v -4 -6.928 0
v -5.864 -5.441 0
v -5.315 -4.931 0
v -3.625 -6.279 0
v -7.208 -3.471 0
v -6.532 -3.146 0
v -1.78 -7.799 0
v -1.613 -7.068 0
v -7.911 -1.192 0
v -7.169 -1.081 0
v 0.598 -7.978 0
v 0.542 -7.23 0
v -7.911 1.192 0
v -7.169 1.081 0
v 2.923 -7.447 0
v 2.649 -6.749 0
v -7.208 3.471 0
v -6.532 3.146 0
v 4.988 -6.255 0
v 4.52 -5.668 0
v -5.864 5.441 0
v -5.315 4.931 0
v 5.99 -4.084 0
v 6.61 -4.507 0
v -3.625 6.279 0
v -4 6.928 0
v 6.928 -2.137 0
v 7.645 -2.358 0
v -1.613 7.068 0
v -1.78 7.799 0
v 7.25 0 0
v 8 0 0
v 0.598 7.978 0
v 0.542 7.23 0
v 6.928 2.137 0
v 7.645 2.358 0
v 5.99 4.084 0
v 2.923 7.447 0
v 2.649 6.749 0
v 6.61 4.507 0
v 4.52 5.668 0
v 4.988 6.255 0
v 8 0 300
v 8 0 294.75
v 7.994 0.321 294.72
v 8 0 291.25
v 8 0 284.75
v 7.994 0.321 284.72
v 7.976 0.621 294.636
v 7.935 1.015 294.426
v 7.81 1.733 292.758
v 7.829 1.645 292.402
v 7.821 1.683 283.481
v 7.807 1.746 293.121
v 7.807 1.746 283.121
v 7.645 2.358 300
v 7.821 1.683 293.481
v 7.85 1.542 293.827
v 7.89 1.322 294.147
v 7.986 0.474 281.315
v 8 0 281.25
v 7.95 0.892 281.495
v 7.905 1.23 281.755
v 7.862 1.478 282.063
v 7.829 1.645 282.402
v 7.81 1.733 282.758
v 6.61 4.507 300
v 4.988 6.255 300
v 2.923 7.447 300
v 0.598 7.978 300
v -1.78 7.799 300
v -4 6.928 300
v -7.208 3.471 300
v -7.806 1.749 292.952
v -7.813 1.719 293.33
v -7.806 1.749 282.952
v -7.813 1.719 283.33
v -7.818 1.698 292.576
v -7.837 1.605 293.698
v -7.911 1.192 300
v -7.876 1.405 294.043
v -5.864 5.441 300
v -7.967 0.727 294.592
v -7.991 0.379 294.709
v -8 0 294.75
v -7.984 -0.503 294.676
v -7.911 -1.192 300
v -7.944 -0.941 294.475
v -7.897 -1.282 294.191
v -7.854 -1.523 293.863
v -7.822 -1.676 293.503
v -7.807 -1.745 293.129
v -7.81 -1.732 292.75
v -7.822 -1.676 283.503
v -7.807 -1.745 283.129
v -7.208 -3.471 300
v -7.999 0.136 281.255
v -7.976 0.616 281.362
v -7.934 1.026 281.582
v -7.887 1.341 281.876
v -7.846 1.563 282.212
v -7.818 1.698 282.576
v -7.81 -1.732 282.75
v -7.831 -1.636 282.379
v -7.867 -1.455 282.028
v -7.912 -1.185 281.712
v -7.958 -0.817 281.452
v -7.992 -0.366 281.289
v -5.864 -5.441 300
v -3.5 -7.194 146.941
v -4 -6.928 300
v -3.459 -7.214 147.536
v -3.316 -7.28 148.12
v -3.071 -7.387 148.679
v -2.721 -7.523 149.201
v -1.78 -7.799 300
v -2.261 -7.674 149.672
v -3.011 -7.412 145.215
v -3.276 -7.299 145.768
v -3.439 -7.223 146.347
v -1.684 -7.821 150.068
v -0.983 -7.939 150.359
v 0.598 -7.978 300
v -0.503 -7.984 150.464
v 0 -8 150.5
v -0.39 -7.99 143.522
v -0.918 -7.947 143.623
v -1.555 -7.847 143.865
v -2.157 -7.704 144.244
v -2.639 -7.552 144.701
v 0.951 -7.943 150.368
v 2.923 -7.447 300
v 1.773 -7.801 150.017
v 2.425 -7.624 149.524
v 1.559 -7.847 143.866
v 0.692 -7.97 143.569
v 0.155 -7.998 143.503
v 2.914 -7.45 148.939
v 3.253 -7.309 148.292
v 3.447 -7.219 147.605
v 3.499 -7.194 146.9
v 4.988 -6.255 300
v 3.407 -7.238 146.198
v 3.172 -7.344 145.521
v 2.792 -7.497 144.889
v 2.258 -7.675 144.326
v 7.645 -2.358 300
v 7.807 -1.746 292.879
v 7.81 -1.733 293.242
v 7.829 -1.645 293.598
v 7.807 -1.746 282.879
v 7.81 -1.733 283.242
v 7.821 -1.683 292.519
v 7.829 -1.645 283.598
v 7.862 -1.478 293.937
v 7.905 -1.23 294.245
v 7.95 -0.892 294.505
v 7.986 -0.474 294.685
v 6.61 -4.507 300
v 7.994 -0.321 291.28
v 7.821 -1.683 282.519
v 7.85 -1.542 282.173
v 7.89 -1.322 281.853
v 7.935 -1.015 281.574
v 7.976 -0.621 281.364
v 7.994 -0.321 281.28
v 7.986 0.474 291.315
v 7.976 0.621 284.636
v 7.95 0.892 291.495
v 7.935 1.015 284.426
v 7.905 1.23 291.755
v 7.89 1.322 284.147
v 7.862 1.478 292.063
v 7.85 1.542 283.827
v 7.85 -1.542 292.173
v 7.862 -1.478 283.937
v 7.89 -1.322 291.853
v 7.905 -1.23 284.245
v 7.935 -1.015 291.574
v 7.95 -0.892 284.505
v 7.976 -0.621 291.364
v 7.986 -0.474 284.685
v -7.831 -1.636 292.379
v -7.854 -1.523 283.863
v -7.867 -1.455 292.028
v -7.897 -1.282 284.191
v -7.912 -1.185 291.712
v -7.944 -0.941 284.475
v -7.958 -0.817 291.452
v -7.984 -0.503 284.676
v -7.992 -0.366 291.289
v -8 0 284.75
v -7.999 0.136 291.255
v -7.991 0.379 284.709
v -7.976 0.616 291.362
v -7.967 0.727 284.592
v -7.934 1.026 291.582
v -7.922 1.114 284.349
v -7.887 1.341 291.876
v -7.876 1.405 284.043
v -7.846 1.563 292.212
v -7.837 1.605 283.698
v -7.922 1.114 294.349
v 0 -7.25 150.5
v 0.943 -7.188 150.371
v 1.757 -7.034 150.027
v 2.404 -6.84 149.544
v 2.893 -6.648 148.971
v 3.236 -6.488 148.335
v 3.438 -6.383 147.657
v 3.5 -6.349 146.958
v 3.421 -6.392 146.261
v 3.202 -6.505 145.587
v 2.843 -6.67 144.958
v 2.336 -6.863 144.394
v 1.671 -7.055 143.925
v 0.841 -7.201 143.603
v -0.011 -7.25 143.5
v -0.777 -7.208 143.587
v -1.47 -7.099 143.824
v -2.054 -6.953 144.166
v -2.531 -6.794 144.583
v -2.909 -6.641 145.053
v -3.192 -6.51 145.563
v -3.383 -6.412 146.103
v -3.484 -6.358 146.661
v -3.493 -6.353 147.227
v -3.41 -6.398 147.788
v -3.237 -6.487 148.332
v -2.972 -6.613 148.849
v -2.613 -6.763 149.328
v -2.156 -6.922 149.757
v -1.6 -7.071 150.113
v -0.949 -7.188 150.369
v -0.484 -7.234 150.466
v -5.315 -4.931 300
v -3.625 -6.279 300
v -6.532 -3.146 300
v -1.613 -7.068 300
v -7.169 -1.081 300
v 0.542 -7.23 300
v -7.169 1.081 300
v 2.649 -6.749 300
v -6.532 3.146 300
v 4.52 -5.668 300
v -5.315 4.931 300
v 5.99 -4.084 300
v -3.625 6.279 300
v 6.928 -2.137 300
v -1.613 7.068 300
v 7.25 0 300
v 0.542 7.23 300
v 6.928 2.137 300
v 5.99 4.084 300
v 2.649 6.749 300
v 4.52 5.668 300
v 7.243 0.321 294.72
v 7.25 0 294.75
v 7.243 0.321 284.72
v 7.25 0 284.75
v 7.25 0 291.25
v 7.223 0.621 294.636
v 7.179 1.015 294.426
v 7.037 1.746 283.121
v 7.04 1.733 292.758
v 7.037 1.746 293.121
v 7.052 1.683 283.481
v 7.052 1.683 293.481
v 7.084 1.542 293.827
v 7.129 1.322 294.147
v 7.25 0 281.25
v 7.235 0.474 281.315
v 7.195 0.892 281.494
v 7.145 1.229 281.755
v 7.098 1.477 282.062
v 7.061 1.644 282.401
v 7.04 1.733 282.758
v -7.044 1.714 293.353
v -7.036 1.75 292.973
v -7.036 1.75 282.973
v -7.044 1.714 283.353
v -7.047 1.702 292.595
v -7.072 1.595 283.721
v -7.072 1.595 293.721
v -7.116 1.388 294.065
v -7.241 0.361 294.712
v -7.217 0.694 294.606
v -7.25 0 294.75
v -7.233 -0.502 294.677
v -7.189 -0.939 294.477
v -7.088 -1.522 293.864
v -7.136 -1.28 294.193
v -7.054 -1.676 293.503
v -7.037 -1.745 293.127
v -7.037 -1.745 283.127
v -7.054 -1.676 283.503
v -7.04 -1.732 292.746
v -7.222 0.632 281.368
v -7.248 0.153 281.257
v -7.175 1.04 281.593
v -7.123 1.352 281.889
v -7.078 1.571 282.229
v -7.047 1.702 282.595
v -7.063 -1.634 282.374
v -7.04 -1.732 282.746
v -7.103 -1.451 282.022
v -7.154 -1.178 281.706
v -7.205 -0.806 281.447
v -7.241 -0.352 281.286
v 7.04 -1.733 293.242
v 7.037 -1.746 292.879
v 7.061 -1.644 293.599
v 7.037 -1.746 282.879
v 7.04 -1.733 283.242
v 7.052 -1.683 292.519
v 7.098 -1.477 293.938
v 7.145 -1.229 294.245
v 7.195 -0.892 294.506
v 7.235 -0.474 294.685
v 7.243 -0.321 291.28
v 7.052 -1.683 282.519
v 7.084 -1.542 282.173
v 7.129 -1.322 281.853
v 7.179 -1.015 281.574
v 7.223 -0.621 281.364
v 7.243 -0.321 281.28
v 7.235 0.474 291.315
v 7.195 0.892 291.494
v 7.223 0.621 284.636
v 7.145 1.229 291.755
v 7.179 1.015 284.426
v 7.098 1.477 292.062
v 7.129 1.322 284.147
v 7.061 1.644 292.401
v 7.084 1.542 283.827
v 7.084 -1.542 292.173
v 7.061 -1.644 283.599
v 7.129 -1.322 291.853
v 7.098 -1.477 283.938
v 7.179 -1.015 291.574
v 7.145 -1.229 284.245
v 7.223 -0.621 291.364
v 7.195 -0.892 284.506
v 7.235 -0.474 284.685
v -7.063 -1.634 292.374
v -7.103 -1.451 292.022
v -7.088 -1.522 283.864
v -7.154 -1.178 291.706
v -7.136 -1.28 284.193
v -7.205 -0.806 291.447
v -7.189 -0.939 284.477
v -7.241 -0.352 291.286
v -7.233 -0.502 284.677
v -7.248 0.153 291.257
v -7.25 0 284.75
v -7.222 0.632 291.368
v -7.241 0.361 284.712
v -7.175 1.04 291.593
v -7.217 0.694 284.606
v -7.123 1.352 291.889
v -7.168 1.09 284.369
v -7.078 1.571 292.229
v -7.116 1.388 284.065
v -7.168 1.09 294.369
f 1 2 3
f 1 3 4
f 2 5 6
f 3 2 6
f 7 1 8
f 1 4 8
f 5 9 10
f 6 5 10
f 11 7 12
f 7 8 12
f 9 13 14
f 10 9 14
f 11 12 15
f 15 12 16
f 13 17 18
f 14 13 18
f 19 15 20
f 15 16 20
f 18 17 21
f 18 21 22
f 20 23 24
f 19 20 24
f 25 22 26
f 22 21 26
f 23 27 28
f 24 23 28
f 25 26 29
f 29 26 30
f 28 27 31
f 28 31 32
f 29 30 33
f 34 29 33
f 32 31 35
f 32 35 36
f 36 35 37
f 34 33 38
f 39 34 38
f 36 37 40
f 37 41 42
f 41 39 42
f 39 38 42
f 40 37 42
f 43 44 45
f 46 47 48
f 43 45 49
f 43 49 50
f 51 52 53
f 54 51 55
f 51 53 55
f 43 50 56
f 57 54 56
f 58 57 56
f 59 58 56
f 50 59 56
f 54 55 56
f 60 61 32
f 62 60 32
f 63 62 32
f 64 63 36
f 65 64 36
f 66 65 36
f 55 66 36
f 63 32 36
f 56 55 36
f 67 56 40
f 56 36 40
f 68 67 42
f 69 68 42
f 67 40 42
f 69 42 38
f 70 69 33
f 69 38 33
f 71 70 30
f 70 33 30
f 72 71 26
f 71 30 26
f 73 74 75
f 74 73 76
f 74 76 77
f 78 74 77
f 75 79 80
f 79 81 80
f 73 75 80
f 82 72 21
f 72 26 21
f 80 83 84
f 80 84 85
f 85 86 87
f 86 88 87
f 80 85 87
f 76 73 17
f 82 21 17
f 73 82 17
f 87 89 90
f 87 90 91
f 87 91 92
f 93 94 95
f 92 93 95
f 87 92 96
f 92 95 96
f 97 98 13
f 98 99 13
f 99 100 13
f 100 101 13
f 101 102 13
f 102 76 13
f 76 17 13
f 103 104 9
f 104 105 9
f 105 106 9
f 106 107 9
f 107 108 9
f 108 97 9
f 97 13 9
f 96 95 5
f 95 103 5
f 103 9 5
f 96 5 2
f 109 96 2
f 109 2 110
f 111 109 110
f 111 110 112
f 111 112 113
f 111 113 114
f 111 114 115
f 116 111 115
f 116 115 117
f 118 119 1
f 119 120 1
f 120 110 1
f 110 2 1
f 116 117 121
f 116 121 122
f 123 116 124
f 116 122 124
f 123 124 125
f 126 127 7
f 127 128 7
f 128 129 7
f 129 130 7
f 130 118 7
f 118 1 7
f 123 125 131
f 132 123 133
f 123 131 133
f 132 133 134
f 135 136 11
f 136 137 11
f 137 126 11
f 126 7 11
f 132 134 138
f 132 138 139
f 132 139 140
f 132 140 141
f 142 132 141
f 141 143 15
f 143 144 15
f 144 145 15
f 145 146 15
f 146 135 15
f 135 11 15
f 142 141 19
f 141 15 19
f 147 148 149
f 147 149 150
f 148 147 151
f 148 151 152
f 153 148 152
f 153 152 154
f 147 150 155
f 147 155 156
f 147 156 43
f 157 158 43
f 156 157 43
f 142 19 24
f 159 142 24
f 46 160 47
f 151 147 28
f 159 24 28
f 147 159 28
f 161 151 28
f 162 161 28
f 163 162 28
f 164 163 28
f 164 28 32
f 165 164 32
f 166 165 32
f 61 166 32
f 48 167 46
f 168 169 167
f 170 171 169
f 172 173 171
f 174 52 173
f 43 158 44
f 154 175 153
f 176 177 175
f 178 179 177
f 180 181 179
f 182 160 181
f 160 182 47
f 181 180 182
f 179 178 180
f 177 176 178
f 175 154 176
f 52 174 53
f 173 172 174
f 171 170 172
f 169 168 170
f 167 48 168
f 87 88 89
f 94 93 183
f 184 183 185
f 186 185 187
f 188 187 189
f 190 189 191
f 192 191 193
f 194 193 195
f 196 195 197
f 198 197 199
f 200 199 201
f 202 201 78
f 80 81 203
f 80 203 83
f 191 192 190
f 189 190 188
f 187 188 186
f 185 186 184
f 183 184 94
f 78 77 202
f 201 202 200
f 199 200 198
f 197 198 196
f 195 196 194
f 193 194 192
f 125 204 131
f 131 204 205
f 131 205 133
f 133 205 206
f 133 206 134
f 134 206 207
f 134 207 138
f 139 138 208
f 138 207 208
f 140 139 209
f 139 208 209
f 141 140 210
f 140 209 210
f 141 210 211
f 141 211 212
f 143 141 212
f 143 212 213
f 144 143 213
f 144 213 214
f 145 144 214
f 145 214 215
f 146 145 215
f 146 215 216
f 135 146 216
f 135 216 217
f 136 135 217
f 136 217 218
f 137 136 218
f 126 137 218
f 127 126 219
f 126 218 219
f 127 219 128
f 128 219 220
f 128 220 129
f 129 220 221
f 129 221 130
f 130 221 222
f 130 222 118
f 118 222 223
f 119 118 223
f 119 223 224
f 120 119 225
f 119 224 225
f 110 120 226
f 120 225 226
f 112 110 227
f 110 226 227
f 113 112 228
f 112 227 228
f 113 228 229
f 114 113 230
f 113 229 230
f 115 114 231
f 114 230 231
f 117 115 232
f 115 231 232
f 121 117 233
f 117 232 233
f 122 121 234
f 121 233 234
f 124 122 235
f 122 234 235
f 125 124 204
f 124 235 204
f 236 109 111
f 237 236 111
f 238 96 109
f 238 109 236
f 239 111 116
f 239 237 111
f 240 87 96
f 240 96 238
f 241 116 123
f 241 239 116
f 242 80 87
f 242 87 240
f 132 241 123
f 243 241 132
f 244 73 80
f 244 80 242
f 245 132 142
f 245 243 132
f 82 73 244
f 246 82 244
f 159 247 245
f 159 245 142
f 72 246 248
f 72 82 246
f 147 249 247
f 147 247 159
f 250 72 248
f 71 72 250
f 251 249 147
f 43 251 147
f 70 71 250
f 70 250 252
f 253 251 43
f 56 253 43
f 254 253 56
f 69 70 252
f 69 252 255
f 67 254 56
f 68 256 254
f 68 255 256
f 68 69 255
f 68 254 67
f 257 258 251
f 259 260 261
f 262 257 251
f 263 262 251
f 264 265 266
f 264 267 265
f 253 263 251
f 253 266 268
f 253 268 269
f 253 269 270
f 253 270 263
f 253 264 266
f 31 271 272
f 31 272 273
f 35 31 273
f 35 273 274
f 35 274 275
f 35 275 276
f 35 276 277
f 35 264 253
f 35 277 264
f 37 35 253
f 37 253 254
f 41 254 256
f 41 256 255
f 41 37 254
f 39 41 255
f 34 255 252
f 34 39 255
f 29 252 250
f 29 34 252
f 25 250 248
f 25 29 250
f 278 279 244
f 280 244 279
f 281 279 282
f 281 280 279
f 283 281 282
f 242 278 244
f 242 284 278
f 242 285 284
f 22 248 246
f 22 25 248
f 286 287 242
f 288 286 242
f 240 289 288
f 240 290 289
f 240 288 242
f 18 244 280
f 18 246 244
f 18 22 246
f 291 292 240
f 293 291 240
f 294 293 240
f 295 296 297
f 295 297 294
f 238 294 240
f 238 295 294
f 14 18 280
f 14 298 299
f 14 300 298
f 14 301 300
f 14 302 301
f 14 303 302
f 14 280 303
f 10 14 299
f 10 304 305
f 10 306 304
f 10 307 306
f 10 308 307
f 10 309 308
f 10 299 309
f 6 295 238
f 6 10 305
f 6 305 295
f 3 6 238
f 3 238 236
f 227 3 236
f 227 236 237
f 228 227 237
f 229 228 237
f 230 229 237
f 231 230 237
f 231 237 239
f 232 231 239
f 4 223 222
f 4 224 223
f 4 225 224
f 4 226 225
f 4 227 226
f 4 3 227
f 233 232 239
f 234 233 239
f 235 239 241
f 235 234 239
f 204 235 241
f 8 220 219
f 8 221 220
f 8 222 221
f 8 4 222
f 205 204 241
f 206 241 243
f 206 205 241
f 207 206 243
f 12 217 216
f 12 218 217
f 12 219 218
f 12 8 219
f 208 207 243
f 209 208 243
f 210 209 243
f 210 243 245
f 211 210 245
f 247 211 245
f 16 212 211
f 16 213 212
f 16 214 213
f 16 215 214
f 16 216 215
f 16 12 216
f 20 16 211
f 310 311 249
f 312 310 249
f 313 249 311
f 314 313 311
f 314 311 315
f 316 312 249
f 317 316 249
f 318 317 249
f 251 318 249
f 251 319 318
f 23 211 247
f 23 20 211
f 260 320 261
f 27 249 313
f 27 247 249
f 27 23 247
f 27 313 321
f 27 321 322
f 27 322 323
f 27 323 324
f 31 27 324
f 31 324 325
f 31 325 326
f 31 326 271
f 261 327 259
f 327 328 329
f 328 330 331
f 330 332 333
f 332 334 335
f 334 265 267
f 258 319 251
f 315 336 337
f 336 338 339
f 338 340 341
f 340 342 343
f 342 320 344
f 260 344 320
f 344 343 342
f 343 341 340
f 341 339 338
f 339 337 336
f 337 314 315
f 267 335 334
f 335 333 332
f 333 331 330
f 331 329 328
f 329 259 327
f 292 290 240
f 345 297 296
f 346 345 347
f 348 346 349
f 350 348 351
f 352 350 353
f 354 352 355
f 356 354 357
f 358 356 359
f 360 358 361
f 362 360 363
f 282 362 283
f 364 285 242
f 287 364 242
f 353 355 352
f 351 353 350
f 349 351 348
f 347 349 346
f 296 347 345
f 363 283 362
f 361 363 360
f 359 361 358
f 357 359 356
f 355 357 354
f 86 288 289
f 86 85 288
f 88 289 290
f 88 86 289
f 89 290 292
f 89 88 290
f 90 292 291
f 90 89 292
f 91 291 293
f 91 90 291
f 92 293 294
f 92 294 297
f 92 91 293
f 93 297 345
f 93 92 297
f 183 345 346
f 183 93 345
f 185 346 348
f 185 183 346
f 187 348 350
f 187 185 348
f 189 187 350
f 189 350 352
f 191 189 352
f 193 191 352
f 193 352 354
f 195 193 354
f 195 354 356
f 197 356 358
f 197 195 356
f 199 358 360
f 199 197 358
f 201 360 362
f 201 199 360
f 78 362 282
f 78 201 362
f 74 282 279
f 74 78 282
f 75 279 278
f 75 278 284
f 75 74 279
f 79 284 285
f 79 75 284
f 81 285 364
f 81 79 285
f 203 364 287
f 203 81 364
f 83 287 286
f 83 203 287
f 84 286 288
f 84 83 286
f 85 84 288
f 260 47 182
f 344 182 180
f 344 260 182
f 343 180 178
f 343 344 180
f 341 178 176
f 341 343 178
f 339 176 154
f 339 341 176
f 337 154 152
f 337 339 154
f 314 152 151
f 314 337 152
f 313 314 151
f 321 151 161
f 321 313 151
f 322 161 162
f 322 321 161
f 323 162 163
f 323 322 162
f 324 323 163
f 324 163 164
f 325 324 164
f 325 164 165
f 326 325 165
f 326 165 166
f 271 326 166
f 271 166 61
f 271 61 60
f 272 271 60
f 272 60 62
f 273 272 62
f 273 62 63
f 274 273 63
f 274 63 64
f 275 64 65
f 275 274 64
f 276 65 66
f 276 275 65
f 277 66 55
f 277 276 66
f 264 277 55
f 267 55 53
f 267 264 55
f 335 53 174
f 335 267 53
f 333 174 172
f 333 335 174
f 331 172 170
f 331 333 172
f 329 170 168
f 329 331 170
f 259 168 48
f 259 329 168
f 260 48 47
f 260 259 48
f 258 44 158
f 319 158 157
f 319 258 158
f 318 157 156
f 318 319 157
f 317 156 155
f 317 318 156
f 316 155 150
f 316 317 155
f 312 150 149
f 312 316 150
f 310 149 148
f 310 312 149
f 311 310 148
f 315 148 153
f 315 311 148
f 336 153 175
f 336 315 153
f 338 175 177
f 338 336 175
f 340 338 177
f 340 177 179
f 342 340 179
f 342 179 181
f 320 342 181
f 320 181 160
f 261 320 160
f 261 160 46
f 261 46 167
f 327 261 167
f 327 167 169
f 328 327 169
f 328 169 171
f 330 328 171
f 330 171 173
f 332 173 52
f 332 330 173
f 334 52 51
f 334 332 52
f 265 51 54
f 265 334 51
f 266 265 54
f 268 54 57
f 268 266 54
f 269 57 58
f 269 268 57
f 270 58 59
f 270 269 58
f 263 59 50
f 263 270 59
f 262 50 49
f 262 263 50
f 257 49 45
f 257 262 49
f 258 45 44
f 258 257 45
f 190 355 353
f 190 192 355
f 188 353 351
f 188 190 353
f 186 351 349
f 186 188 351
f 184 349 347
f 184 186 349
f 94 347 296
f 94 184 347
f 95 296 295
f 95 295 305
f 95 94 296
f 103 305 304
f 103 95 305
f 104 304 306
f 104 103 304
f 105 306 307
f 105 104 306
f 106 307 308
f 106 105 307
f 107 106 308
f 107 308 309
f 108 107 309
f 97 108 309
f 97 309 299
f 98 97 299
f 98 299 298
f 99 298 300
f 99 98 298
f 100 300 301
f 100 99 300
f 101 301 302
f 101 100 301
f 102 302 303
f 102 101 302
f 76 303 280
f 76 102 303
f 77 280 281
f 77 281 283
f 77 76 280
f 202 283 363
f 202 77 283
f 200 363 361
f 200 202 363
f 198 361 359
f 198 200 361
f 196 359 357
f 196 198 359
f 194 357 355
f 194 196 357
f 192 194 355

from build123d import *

# Parameters (mm, degrees)
ESBO_O1_R                  = 8
ESBO_O1_R_2                = 7.25
RESSALTO_EXTRUS_O1_DEPTH   = 300
CORTE_EXTRUS_O1_DEPTH      = 300
CORTE_EXTRUS_O1_DEPTH_BACK = 300
ESBO_O2_R                  = 1.75
CUT_EXTRUDE1_REACH         = 302.213
CUT_EXTRUDE1_END_RADIUS    = 8
SKETCH2_R                  = 3.5


with BuildPart() as part:
    # Esboço1 → Ressalto-extrusão1 (new body)
    with BuildSketch(Plane.XY):
        Circle(ESBO_O1_R)
        Circle(ESBO_O1_R_2, mode=Mode.SUBTRACT)
    extrude(amount=RESSALTO_EXTRUS_O1_DEPTH)

    # Esboço2 → Corte-extrusão1 (cut, two sides: drawn at the far end of the back side and taken through both)
    with BuildSketch(Plane(origin=(0, 0, 0), x_dir=(0, 0, -1), z_dir=(1, 0, 0)).offset(-CORTE_EXTRUS_O1_DEPTH_BACK)):
        with Locations(Location((-293, 0, 0), (0, 0, 180))):
            Circle(ESBO_O2_R)
        with Locations(Location((-283, 0, 0), (0, 0, 180))):
            Circle(ESBO_O2_R)
    extrude(amount=CORTE_EXTRUS_O1_DEPTH + CORTE_EXTRUS_O1_DEPTH_BACK, mode=Mode.SUBTRACT)

    # Cut-Extrude1: up to this cylinder (the profile starts inside it)
    cut_extrude1_end = Plane(origin=(0, 0, 147), z_dir=(0, 0, -1)) * Cylinder(CUT_EXTRUDE1_END_RADIUS, 621.426, mode=Mode.PRIVATE)
    # Sketch2 → Cut-Extrude1 (cut, up to the surface)
    with BuildSketch(Plane(origin=(0, 0, 0), x_dir=(1, 0, 0), z_dir=(0, 1, 0)), mode=Mode.PRIVATE) as cut_extrude1_sk1:
        with Locations(Location((0, -147, 0), (0, 0, 270))):
            Circle(SKETCH2_R)
    cut_extrude1_tool1 = extrude(cut_extrude1_sk1.sketch, amount=-CUT_EXTRUDE1_REACH, mode=Mode.PRIVATE) & cut_extrude1_end
    add(cut_extrude1_tool1.solids().sort_by_distance((0, 0, 147))[0], mode=Mode.SUBTRACT)


solid = part.part
